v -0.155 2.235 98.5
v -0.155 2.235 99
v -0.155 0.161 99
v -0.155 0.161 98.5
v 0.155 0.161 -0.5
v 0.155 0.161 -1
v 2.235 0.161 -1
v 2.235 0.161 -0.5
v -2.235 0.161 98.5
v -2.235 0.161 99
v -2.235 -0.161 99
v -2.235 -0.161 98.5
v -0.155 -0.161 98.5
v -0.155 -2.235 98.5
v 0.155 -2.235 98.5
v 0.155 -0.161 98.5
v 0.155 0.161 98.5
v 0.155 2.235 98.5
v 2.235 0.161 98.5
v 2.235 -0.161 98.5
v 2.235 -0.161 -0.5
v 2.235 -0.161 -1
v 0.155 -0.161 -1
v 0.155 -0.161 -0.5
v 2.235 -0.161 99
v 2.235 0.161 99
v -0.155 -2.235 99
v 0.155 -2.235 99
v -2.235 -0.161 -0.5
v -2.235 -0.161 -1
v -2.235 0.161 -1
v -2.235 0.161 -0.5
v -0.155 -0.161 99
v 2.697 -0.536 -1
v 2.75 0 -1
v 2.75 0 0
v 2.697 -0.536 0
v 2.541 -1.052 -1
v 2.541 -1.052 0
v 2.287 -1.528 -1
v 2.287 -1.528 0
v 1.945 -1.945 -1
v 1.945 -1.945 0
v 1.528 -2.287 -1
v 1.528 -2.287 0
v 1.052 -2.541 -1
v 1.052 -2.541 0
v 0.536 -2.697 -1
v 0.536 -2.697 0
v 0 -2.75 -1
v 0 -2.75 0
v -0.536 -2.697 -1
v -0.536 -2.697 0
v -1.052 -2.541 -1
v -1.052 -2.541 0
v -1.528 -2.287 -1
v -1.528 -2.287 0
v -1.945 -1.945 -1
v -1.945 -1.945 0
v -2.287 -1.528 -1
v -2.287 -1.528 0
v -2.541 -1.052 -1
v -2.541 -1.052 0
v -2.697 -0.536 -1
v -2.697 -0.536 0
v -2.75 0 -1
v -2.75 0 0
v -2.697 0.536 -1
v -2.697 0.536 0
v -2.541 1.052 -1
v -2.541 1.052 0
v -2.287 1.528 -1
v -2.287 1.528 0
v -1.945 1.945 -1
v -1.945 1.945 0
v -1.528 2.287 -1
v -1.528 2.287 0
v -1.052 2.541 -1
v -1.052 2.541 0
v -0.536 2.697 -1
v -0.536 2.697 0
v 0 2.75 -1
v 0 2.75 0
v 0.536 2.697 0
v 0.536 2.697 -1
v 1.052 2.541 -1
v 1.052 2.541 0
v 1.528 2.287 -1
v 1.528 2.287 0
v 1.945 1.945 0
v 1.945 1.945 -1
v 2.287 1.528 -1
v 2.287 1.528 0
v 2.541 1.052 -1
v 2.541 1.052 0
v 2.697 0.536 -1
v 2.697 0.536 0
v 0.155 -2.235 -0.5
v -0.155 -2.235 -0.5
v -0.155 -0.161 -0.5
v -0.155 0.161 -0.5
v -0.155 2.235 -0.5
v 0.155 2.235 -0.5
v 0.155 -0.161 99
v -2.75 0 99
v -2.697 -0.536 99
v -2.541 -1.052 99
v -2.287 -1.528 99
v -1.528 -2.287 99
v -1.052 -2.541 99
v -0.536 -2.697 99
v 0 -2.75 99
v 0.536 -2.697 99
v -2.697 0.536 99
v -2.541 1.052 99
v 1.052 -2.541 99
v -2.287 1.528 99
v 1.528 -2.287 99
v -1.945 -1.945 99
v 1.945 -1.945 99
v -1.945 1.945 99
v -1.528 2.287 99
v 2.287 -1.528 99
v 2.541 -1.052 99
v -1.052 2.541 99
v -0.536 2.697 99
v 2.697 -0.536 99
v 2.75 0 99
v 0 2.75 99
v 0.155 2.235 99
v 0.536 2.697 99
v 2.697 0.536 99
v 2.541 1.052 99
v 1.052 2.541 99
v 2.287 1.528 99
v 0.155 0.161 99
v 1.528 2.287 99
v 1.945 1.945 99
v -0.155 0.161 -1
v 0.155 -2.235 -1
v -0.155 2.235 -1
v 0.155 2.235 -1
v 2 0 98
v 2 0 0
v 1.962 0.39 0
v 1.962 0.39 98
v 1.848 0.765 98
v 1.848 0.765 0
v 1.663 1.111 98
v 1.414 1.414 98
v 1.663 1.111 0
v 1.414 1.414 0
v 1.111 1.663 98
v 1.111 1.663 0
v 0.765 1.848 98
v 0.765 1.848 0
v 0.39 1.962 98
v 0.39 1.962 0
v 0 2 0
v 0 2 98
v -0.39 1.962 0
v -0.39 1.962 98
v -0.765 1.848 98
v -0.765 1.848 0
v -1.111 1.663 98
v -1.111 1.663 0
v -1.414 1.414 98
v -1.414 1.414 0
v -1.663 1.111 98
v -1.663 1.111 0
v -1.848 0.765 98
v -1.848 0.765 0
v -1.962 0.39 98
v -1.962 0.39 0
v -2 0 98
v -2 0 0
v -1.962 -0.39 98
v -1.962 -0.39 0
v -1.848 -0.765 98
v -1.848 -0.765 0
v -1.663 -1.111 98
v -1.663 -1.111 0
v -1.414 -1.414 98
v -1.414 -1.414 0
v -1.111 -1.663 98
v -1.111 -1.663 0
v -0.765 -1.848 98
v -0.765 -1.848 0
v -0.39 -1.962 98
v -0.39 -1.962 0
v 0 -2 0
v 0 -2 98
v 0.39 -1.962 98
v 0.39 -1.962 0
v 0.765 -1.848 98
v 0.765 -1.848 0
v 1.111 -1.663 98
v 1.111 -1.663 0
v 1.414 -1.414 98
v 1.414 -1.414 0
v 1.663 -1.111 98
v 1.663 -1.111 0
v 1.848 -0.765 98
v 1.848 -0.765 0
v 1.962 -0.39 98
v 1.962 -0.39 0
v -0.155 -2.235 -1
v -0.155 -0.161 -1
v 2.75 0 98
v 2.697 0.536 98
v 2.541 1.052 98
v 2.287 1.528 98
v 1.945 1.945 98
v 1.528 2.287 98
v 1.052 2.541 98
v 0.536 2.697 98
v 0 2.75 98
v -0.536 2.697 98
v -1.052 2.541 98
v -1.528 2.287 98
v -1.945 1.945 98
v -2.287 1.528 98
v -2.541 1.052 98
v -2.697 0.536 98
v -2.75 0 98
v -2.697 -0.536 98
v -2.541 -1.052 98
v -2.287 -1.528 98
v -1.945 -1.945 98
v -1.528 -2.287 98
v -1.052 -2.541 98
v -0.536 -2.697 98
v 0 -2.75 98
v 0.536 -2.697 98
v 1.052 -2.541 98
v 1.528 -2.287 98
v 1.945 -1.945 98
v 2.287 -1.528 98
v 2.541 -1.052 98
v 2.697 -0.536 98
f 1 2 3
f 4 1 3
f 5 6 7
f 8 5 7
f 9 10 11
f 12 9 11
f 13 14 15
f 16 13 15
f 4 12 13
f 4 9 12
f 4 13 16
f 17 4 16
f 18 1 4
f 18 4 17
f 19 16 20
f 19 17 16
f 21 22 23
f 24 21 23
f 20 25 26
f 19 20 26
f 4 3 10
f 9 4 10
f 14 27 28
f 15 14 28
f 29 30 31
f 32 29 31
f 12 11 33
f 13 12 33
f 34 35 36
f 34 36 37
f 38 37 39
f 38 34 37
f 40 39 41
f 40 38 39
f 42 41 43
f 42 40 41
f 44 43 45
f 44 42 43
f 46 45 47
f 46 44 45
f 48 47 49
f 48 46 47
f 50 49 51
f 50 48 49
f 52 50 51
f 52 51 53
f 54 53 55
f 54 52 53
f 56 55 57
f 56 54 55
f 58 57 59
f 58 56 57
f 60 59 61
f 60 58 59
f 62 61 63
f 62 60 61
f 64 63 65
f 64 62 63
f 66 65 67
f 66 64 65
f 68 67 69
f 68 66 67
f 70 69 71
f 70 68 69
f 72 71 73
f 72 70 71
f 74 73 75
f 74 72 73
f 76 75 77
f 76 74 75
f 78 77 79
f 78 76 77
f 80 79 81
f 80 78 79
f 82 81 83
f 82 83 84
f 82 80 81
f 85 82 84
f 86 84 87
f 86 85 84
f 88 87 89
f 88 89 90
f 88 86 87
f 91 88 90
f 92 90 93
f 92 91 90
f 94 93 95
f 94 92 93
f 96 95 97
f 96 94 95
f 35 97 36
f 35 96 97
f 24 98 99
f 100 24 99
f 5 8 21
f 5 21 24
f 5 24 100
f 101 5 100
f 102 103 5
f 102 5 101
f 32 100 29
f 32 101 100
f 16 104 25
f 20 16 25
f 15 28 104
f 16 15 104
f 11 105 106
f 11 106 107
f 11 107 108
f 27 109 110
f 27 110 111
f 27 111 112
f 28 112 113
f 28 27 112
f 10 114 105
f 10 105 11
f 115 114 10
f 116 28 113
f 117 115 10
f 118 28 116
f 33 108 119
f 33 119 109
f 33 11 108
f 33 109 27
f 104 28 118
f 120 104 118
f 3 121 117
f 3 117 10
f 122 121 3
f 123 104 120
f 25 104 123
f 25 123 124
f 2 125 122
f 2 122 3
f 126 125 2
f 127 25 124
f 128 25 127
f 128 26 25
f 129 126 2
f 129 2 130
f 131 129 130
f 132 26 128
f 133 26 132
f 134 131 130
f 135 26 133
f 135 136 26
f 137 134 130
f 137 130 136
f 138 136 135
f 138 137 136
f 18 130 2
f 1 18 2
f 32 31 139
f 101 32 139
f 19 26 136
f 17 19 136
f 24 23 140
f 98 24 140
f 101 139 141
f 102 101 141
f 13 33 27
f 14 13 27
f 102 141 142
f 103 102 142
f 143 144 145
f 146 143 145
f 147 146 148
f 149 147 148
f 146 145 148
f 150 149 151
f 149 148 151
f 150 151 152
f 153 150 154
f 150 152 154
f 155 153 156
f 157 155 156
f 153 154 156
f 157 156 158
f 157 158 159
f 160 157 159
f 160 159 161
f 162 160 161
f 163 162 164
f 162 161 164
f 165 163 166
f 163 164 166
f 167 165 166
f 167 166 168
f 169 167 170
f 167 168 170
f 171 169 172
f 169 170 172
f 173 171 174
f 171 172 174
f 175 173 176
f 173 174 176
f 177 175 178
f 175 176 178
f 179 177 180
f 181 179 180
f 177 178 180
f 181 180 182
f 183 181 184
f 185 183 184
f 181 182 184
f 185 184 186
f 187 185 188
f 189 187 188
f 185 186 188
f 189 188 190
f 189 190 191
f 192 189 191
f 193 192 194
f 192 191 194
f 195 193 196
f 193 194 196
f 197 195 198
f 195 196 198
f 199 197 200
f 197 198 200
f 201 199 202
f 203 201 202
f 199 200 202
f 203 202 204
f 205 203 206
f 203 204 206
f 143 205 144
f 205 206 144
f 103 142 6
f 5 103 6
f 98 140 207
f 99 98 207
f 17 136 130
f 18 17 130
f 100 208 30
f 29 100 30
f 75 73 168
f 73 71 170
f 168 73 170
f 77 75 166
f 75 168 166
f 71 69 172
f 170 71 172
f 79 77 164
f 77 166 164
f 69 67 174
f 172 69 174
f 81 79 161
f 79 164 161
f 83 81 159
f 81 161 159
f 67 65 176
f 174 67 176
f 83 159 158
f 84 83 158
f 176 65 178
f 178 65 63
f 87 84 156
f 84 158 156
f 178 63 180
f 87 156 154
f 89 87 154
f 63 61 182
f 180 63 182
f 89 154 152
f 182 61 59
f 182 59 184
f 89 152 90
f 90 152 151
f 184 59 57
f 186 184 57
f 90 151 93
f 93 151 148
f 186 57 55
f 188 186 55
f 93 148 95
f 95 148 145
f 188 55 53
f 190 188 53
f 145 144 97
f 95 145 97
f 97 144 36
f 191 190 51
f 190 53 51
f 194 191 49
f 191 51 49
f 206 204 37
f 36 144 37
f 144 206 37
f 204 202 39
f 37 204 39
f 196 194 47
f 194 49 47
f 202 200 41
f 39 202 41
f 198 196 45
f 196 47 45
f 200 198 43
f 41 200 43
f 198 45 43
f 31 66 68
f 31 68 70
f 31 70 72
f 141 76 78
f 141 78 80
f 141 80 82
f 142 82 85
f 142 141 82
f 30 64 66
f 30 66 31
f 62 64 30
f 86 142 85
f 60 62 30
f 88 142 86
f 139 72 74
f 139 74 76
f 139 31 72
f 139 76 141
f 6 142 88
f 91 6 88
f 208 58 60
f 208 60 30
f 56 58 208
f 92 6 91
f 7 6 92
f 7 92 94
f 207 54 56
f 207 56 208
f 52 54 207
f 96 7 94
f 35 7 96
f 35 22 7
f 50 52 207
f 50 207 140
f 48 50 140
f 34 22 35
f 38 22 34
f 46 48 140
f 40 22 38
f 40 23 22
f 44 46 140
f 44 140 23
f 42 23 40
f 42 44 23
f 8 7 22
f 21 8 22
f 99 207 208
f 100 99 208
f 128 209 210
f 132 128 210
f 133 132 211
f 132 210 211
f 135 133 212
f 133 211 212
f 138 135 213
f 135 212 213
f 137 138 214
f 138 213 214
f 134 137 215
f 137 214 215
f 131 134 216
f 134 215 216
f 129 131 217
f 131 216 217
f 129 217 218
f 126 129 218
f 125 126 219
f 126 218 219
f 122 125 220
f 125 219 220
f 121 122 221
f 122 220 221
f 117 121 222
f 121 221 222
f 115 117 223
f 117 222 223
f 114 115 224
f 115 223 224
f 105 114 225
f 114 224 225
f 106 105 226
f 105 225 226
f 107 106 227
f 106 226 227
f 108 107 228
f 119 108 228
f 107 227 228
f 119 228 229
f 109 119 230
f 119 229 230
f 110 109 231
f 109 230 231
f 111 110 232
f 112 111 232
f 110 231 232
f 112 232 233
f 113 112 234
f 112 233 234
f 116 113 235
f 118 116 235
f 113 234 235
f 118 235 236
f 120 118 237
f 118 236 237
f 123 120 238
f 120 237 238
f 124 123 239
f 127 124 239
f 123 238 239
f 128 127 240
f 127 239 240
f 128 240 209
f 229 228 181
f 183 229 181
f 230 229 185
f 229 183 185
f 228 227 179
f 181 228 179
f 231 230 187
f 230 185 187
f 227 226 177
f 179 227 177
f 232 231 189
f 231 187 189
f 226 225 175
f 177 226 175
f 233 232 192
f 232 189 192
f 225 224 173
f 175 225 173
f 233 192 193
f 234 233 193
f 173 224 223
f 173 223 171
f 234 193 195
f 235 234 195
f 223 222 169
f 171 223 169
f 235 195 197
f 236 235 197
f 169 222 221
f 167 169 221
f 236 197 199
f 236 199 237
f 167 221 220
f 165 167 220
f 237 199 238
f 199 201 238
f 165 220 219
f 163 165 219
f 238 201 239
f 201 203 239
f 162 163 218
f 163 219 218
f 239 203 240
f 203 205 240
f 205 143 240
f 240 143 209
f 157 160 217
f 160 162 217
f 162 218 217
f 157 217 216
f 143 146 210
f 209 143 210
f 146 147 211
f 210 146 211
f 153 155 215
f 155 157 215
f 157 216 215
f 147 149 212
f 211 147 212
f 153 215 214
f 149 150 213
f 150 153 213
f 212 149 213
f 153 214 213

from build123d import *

# Parameters (mm, degrees)
SKETCH1_R           = 2
BOSS_EXTRUDE1_DEPTH = 98
SKETCH2_R           = 2.75
BOSS_EXTRUDE2_DEPTH = 1
BOSS_EXTRUDE3_START = 1
SKETCH3_R           = 2.75
BOSS_EXTRUDE3_DEPTH = 1
CUT_EXTRUDE1_DEPTH  = 0.5
CUT_EXTRUDE2_DEPTH  = 0.5


with BuildPart() as part:
    # Sketch1 → Boss-Extrude1 (new body)
    with BuildSketch(Plane.XY):
        Circle(SKETCH1_R)
    extrude(amount=BOSS_EXTRUDE1_DEPTH)

    # Sketch2 → Boss-Extrude2 (add)
    with BuildSketch(Plane.XY.offset(98)):
        Circle(SKETCH2_R)
    extrude(amount=BOSS_EXTRUDE2_DEPTH)

    # Sketch3 → Boss-Extrude3 (add)
    with BuildSketch(Plane(origin=(0, 0, 0), x_dir=(-1, 0, 0), z_dir=(0, 0, -1)).offset(BOSS_EXTRUDE3_START)):
        with Locations(Location((0, 0, 0), (0, 0, 180))):
            Circle(SKETCH3_R)
    extrude(amount=-BOSS_EXTRUDE3_DEPTH)

    # Sketch4 → Cut-Extrude1 (cut)
    with BuildSketch(Plane(origin=(0, 0, -1), x_dir=(-1, 0, 0), z_dir=(0, 0, -1))):
        Polygon((-0.154926193, -0.160877279), (-0.154926193, -2.234675522), (0.154926193, -2.234675522), (0.154926193, -0.160877279), (2.234675522, -0.160877279), (2.234675522, 0.160877279), (0.154926193, 0.160877279), (0.154926193, 2.234675522), (-0.154926193, 2.234675522), (-0.154926193, 0.160877279), (-2.234675522, 0.160877279), (-2.234675522, -0.160877279), align=None)
    extrude(amount=-CUT_EXTRUDE1_DEPTH, mode=Mode.SUBTRACT)

    # Sketch5 → Cut-Extrude2 (cut)
    with BuildSketch(Plane.XY.offset(99)):
        Polygon((-2.234675522, -0.160877279), (-0.154926193, -0.160877279), (-0.154926193, -2.234675522), (0.154926193, -2.234675522), (0.154926193, -0.160877279), (2.234675522, -0.160877279), (2.234675522, 0.160877279), (0.154926193, 0.160877279), (0.154926193, 2.234675522), (-0.154926193, 2.234675522), (-0.154926193, 0.160877279), (-2.234675522, 0.160877279), align=None)
    extrude(amount=-CUT_EXTRUDE2_DEPTH, mode=Mode.SUBTRACT)


solid = part.part
